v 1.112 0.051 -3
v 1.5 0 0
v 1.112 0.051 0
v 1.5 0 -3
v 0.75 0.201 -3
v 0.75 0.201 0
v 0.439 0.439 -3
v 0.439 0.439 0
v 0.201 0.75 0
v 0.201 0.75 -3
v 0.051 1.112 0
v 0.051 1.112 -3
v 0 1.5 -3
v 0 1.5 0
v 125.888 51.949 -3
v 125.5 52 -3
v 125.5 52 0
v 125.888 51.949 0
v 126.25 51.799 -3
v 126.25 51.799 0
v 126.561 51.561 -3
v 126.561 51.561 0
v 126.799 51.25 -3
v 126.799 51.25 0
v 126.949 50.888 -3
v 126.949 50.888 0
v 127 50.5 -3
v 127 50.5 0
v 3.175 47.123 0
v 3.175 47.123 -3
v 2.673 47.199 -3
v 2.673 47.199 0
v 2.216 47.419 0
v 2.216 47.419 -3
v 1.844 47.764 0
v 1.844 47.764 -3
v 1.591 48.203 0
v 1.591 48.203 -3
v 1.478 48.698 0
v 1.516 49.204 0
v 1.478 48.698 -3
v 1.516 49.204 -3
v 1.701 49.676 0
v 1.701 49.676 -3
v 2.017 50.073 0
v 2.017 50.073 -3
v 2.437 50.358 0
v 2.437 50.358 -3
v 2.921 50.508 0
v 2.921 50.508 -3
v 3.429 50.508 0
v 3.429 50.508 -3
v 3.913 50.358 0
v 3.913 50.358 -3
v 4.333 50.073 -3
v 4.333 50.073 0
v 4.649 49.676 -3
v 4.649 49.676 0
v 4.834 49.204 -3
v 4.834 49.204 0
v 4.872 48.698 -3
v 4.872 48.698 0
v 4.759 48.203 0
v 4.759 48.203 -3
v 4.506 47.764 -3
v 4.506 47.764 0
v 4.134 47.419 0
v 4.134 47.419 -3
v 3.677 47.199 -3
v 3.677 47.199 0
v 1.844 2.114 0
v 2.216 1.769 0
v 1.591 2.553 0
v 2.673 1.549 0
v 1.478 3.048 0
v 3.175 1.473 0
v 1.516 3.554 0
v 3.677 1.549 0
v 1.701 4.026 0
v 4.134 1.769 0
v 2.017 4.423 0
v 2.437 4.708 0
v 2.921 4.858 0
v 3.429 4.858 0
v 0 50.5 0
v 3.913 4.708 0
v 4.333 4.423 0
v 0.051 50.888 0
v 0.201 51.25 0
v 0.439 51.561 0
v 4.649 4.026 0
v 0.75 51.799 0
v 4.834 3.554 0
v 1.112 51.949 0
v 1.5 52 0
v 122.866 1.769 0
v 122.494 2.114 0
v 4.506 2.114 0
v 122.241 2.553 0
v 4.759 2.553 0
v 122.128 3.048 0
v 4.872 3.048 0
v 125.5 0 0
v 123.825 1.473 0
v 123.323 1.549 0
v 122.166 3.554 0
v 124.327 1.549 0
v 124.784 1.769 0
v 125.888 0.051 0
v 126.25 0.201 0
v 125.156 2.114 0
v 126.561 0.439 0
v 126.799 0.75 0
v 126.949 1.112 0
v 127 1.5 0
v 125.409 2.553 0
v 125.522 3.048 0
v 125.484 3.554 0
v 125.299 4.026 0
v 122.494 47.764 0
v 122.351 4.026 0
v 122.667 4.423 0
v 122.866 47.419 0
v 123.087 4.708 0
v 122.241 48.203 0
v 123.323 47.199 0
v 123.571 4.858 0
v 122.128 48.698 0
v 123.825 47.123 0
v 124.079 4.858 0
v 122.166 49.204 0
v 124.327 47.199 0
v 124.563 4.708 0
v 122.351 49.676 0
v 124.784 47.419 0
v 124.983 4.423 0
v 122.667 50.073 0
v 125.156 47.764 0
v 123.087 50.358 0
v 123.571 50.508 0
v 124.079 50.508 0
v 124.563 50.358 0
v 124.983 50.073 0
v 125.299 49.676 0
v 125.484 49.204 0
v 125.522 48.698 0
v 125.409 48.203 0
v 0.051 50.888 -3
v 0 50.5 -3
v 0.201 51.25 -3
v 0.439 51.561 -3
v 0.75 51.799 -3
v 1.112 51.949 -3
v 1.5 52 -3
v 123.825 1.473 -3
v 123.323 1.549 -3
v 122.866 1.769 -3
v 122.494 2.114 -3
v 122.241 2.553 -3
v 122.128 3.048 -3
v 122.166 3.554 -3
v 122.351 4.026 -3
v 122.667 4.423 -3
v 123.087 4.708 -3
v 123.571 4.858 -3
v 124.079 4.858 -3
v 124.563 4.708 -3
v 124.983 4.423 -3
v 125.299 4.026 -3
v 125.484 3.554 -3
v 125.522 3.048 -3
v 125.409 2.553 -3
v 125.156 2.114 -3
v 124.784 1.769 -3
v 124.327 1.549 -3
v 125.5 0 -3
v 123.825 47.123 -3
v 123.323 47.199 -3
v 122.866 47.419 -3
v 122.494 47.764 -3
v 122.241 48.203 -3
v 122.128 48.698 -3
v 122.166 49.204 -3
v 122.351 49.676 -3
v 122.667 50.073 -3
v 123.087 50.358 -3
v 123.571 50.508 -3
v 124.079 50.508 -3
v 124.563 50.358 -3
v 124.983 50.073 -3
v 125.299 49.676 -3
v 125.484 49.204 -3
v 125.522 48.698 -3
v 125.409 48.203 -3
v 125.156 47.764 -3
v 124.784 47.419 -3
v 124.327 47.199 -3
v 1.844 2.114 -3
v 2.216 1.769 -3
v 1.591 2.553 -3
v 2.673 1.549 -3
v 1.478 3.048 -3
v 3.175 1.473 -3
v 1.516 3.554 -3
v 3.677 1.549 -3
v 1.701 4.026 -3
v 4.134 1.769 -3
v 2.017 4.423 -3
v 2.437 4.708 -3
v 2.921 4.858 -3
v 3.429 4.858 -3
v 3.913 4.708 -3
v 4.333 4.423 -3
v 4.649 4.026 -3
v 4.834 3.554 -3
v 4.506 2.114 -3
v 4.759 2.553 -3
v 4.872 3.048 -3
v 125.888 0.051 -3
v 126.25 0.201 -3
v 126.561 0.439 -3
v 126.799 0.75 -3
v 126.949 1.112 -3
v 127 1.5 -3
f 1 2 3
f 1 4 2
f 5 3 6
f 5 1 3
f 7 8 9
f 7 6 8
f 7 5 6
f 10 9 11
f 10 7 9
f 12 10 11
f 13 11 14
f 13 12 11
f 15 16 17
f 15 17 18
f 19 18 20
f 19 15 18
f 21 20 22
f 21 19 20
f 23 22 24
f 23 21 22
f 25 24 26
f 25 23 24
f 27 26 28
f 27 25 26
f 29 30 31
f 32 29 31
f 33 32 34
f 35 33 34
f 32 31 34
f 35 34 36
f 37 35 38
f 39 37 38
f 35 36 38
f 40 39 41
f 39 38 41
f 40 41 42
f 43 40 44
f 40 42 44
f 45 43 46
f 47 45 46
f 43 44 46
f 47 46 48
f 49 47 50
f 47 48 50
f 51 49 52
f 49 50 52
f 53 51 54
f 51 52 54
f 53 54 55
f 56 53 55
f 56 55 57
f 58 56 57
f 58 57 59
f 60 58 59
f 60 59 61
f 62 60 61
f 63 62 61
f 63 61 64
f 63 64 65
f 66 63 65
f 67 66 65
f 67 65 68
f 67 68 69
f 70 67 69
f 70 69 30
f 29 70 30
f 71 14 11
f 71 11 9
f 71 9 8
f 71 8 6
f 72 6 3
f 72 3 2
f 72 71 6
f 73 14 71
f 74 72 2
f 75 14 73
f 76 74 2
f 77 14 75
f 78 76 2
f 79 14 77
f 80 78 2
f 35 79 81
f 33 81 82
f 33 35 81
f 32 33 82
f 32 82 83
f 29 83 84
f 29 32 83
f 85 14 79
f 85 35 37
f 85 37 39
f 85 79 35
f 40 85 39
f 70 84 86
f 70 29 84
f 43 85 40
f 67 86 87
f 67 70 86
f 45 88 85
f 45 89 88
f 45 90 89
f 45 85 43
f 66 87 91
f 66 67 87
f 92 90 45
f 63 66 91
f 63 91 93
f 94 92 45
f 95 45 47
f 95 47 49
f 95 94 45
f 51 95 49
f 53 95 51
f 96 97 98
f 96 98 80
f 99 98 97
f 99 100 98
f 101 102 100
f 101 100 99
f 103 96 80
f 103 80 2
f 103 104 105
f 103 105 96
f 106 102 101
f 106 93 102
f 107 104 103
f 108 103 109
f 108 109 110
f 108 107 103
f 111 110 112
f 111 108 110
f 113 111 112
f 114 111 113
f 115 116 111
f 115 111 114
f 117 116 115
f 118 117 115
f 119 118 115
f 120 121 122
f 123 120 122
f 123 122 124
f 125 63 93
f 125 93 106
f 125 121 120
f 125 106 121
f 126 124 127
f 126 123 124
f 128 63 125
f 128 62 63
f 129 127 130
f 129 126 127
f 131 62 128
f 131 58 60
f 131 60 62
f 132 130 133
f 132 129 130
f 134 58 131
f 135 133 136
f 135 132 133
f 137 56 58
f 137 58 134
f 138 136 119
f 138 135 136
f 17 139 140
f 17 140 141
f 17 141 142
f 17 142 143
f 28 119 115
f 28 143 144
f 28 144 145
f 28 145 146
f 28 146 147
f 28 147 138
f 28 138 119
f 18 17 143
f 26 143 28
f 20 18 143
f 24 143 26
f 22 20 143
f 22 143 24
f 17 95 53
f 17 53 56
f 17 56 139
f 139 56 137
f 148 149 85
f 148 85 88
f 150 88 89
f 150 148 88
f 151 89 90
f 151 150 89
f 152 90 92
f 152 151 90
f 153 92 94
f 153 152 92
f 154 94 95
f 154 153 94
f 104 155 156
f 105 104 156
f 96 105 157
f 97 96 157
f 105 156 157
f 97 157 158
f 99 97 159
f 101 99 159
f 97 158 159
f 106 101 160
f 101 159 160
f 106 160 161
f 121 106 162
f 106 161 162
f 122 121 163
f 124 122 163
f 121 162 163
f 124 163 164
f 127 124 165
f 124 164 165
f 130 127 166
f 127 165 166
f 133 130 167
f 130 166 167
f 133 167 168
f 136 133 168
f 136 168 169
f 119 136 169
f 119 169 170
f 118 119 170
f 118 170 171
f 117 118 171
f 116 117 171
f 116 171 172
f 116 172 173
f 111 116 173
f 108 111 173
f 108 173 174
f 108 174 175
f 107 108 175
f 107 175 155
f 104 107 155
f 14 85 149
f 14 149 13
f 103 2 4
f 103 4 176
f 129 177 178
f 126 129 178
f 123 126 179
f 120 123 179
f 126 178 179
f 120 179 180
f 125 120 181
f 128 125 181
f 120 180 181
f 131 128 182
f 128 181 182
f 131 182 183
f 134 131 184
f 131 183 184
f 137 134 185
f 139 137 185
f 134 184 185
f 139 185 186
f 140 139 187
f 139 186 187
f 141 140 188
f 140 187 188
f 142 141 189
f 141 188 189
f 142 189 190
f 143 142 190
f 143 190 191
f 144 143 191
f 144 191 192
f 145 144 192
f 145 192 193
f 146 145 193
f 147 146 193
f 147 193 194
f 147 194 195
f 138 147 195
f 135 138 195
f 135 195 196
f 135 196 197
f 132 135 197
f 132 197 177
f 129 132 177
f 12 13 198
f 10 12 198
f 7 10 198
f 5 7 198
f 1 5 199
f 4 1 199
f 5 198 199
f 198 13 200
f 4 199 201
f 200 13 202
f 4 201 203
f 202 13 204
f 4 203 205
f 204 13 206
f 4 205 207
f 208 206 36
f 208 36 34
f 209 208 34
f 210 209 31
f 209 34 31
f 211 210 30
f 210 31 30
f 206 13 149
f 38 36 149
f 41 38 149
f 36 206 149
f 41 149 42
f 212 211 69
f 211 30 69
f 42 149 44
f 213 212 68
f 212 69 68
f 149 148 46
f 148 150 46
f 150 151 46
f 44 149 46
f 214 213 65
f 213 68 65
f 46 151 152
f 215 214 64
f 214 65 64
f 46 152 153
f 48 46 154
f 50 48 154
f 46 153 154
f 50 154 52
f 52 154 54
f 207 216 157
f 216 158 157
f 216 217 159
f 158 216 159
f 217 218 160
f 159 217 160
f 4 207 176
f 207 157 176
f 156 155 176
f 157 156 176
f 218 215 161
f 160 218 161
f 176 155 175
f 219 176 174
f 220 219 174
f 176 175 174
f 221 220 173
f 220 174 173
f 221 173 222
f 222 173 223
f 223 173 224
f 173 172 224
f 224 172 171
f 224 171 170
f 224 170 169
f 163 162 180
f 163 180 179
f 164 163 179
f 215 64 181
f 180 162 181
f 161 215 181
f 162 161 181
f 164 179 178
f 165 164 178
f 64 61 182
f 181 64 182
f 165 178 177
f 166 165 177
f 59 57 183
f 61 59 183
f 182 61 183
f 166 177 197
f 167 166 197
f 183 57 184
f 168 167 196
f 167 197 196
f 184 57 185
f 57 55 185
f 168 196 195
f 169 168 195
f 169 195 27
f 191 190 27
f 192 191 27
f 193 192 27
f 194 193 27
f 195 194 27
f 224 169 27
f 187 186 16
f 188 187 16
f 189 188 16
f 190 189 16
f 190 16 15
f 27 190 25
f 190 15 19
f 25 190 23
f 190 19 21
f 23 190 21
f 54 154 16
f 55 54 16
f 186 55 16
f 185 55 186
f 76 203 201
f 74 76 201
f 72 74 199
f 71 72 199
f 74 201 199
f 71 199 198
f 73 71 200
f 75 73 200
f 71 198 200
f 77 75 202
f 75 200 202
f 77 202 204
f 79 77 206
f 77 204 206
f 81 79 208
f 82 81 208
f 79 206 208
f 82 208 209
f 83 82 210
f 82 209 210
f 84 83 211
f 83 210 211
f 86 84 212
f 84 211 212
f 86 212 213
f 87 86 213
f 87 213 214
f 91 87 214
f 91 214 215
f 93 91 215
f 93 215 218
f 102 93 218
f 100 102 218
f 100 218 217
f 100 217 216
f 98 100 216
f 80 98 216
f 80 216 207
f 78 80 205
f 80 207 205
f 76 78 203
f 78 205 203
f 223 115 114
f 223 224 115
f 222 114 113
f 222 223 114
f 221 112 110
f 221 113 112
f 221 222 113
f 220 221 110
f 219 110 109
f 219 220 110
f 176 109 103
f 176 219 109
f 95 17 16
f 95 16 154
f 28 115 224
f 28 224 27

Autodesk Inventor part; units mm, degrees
ref_plane "YZ Plane" through (0, 0, 0) normal (1, 0, 0) x (0, 1, 0)
ref_plane "XZ Plane" through (0, 0, 0) normal (0, 1, 0) x (-1, 0, 0)
ref_plane "XY Plane" through (0, 0, 0) normal (0, 0, 1) x (1, 0, 0)
sketch "Main Profile" plane through (0, 0, 0) normal (0, 0, 1) x (1, 0, 0)
  line L0 (0, 0) -> (127, 0)
  line L1 (127, 0) -> (127, 52)
  line L2 (127, 52) -> (0, 52)
  line L3 (0, 52) -> (0, 0)
  line L4 (0, 26) -> (127, 26)
  line L5 (63.5, 52) -> (63.5, 0)
  point P0 (3.175, 48.825)
  point P1 (123.825, 48.825)
  point P2 (3.175, 3.175)
  point P3 (123.825, 3.175)
  dimension "d0" = 127
  dimension "d1" = 52
  dimension "d2" = 3.175
  dimension "d3" = 3.175
extrude "Panel" add sketch "Main Profile" against normal blind 3
hole "Mounting Hole" at (3.175, 48.825, 0) direction (0, 0, -1) diameter 3.4036 end through all clearance for "Socket Head Cap Screw" size "M3" standard "Ansi Metric M Profile"
pattern_sketch "Mounting Holes" of "Mounting Hole" from (3.175, 48.825, 0) copies at (123.825, 48.825, 0) at (3.175, 3.175, 0) at (123.825, 3.175, 0)
fillet "Corner Fillets" radius 1.5 4 edges at (0, 52, -1.5) (0, 0, -1.5) (127, 0, -1.5) (127, 52, -1.5)
equation "\"d3\" = d2"
properties part number "Junction Box Modbay Cover" material "ABS Plastic"
